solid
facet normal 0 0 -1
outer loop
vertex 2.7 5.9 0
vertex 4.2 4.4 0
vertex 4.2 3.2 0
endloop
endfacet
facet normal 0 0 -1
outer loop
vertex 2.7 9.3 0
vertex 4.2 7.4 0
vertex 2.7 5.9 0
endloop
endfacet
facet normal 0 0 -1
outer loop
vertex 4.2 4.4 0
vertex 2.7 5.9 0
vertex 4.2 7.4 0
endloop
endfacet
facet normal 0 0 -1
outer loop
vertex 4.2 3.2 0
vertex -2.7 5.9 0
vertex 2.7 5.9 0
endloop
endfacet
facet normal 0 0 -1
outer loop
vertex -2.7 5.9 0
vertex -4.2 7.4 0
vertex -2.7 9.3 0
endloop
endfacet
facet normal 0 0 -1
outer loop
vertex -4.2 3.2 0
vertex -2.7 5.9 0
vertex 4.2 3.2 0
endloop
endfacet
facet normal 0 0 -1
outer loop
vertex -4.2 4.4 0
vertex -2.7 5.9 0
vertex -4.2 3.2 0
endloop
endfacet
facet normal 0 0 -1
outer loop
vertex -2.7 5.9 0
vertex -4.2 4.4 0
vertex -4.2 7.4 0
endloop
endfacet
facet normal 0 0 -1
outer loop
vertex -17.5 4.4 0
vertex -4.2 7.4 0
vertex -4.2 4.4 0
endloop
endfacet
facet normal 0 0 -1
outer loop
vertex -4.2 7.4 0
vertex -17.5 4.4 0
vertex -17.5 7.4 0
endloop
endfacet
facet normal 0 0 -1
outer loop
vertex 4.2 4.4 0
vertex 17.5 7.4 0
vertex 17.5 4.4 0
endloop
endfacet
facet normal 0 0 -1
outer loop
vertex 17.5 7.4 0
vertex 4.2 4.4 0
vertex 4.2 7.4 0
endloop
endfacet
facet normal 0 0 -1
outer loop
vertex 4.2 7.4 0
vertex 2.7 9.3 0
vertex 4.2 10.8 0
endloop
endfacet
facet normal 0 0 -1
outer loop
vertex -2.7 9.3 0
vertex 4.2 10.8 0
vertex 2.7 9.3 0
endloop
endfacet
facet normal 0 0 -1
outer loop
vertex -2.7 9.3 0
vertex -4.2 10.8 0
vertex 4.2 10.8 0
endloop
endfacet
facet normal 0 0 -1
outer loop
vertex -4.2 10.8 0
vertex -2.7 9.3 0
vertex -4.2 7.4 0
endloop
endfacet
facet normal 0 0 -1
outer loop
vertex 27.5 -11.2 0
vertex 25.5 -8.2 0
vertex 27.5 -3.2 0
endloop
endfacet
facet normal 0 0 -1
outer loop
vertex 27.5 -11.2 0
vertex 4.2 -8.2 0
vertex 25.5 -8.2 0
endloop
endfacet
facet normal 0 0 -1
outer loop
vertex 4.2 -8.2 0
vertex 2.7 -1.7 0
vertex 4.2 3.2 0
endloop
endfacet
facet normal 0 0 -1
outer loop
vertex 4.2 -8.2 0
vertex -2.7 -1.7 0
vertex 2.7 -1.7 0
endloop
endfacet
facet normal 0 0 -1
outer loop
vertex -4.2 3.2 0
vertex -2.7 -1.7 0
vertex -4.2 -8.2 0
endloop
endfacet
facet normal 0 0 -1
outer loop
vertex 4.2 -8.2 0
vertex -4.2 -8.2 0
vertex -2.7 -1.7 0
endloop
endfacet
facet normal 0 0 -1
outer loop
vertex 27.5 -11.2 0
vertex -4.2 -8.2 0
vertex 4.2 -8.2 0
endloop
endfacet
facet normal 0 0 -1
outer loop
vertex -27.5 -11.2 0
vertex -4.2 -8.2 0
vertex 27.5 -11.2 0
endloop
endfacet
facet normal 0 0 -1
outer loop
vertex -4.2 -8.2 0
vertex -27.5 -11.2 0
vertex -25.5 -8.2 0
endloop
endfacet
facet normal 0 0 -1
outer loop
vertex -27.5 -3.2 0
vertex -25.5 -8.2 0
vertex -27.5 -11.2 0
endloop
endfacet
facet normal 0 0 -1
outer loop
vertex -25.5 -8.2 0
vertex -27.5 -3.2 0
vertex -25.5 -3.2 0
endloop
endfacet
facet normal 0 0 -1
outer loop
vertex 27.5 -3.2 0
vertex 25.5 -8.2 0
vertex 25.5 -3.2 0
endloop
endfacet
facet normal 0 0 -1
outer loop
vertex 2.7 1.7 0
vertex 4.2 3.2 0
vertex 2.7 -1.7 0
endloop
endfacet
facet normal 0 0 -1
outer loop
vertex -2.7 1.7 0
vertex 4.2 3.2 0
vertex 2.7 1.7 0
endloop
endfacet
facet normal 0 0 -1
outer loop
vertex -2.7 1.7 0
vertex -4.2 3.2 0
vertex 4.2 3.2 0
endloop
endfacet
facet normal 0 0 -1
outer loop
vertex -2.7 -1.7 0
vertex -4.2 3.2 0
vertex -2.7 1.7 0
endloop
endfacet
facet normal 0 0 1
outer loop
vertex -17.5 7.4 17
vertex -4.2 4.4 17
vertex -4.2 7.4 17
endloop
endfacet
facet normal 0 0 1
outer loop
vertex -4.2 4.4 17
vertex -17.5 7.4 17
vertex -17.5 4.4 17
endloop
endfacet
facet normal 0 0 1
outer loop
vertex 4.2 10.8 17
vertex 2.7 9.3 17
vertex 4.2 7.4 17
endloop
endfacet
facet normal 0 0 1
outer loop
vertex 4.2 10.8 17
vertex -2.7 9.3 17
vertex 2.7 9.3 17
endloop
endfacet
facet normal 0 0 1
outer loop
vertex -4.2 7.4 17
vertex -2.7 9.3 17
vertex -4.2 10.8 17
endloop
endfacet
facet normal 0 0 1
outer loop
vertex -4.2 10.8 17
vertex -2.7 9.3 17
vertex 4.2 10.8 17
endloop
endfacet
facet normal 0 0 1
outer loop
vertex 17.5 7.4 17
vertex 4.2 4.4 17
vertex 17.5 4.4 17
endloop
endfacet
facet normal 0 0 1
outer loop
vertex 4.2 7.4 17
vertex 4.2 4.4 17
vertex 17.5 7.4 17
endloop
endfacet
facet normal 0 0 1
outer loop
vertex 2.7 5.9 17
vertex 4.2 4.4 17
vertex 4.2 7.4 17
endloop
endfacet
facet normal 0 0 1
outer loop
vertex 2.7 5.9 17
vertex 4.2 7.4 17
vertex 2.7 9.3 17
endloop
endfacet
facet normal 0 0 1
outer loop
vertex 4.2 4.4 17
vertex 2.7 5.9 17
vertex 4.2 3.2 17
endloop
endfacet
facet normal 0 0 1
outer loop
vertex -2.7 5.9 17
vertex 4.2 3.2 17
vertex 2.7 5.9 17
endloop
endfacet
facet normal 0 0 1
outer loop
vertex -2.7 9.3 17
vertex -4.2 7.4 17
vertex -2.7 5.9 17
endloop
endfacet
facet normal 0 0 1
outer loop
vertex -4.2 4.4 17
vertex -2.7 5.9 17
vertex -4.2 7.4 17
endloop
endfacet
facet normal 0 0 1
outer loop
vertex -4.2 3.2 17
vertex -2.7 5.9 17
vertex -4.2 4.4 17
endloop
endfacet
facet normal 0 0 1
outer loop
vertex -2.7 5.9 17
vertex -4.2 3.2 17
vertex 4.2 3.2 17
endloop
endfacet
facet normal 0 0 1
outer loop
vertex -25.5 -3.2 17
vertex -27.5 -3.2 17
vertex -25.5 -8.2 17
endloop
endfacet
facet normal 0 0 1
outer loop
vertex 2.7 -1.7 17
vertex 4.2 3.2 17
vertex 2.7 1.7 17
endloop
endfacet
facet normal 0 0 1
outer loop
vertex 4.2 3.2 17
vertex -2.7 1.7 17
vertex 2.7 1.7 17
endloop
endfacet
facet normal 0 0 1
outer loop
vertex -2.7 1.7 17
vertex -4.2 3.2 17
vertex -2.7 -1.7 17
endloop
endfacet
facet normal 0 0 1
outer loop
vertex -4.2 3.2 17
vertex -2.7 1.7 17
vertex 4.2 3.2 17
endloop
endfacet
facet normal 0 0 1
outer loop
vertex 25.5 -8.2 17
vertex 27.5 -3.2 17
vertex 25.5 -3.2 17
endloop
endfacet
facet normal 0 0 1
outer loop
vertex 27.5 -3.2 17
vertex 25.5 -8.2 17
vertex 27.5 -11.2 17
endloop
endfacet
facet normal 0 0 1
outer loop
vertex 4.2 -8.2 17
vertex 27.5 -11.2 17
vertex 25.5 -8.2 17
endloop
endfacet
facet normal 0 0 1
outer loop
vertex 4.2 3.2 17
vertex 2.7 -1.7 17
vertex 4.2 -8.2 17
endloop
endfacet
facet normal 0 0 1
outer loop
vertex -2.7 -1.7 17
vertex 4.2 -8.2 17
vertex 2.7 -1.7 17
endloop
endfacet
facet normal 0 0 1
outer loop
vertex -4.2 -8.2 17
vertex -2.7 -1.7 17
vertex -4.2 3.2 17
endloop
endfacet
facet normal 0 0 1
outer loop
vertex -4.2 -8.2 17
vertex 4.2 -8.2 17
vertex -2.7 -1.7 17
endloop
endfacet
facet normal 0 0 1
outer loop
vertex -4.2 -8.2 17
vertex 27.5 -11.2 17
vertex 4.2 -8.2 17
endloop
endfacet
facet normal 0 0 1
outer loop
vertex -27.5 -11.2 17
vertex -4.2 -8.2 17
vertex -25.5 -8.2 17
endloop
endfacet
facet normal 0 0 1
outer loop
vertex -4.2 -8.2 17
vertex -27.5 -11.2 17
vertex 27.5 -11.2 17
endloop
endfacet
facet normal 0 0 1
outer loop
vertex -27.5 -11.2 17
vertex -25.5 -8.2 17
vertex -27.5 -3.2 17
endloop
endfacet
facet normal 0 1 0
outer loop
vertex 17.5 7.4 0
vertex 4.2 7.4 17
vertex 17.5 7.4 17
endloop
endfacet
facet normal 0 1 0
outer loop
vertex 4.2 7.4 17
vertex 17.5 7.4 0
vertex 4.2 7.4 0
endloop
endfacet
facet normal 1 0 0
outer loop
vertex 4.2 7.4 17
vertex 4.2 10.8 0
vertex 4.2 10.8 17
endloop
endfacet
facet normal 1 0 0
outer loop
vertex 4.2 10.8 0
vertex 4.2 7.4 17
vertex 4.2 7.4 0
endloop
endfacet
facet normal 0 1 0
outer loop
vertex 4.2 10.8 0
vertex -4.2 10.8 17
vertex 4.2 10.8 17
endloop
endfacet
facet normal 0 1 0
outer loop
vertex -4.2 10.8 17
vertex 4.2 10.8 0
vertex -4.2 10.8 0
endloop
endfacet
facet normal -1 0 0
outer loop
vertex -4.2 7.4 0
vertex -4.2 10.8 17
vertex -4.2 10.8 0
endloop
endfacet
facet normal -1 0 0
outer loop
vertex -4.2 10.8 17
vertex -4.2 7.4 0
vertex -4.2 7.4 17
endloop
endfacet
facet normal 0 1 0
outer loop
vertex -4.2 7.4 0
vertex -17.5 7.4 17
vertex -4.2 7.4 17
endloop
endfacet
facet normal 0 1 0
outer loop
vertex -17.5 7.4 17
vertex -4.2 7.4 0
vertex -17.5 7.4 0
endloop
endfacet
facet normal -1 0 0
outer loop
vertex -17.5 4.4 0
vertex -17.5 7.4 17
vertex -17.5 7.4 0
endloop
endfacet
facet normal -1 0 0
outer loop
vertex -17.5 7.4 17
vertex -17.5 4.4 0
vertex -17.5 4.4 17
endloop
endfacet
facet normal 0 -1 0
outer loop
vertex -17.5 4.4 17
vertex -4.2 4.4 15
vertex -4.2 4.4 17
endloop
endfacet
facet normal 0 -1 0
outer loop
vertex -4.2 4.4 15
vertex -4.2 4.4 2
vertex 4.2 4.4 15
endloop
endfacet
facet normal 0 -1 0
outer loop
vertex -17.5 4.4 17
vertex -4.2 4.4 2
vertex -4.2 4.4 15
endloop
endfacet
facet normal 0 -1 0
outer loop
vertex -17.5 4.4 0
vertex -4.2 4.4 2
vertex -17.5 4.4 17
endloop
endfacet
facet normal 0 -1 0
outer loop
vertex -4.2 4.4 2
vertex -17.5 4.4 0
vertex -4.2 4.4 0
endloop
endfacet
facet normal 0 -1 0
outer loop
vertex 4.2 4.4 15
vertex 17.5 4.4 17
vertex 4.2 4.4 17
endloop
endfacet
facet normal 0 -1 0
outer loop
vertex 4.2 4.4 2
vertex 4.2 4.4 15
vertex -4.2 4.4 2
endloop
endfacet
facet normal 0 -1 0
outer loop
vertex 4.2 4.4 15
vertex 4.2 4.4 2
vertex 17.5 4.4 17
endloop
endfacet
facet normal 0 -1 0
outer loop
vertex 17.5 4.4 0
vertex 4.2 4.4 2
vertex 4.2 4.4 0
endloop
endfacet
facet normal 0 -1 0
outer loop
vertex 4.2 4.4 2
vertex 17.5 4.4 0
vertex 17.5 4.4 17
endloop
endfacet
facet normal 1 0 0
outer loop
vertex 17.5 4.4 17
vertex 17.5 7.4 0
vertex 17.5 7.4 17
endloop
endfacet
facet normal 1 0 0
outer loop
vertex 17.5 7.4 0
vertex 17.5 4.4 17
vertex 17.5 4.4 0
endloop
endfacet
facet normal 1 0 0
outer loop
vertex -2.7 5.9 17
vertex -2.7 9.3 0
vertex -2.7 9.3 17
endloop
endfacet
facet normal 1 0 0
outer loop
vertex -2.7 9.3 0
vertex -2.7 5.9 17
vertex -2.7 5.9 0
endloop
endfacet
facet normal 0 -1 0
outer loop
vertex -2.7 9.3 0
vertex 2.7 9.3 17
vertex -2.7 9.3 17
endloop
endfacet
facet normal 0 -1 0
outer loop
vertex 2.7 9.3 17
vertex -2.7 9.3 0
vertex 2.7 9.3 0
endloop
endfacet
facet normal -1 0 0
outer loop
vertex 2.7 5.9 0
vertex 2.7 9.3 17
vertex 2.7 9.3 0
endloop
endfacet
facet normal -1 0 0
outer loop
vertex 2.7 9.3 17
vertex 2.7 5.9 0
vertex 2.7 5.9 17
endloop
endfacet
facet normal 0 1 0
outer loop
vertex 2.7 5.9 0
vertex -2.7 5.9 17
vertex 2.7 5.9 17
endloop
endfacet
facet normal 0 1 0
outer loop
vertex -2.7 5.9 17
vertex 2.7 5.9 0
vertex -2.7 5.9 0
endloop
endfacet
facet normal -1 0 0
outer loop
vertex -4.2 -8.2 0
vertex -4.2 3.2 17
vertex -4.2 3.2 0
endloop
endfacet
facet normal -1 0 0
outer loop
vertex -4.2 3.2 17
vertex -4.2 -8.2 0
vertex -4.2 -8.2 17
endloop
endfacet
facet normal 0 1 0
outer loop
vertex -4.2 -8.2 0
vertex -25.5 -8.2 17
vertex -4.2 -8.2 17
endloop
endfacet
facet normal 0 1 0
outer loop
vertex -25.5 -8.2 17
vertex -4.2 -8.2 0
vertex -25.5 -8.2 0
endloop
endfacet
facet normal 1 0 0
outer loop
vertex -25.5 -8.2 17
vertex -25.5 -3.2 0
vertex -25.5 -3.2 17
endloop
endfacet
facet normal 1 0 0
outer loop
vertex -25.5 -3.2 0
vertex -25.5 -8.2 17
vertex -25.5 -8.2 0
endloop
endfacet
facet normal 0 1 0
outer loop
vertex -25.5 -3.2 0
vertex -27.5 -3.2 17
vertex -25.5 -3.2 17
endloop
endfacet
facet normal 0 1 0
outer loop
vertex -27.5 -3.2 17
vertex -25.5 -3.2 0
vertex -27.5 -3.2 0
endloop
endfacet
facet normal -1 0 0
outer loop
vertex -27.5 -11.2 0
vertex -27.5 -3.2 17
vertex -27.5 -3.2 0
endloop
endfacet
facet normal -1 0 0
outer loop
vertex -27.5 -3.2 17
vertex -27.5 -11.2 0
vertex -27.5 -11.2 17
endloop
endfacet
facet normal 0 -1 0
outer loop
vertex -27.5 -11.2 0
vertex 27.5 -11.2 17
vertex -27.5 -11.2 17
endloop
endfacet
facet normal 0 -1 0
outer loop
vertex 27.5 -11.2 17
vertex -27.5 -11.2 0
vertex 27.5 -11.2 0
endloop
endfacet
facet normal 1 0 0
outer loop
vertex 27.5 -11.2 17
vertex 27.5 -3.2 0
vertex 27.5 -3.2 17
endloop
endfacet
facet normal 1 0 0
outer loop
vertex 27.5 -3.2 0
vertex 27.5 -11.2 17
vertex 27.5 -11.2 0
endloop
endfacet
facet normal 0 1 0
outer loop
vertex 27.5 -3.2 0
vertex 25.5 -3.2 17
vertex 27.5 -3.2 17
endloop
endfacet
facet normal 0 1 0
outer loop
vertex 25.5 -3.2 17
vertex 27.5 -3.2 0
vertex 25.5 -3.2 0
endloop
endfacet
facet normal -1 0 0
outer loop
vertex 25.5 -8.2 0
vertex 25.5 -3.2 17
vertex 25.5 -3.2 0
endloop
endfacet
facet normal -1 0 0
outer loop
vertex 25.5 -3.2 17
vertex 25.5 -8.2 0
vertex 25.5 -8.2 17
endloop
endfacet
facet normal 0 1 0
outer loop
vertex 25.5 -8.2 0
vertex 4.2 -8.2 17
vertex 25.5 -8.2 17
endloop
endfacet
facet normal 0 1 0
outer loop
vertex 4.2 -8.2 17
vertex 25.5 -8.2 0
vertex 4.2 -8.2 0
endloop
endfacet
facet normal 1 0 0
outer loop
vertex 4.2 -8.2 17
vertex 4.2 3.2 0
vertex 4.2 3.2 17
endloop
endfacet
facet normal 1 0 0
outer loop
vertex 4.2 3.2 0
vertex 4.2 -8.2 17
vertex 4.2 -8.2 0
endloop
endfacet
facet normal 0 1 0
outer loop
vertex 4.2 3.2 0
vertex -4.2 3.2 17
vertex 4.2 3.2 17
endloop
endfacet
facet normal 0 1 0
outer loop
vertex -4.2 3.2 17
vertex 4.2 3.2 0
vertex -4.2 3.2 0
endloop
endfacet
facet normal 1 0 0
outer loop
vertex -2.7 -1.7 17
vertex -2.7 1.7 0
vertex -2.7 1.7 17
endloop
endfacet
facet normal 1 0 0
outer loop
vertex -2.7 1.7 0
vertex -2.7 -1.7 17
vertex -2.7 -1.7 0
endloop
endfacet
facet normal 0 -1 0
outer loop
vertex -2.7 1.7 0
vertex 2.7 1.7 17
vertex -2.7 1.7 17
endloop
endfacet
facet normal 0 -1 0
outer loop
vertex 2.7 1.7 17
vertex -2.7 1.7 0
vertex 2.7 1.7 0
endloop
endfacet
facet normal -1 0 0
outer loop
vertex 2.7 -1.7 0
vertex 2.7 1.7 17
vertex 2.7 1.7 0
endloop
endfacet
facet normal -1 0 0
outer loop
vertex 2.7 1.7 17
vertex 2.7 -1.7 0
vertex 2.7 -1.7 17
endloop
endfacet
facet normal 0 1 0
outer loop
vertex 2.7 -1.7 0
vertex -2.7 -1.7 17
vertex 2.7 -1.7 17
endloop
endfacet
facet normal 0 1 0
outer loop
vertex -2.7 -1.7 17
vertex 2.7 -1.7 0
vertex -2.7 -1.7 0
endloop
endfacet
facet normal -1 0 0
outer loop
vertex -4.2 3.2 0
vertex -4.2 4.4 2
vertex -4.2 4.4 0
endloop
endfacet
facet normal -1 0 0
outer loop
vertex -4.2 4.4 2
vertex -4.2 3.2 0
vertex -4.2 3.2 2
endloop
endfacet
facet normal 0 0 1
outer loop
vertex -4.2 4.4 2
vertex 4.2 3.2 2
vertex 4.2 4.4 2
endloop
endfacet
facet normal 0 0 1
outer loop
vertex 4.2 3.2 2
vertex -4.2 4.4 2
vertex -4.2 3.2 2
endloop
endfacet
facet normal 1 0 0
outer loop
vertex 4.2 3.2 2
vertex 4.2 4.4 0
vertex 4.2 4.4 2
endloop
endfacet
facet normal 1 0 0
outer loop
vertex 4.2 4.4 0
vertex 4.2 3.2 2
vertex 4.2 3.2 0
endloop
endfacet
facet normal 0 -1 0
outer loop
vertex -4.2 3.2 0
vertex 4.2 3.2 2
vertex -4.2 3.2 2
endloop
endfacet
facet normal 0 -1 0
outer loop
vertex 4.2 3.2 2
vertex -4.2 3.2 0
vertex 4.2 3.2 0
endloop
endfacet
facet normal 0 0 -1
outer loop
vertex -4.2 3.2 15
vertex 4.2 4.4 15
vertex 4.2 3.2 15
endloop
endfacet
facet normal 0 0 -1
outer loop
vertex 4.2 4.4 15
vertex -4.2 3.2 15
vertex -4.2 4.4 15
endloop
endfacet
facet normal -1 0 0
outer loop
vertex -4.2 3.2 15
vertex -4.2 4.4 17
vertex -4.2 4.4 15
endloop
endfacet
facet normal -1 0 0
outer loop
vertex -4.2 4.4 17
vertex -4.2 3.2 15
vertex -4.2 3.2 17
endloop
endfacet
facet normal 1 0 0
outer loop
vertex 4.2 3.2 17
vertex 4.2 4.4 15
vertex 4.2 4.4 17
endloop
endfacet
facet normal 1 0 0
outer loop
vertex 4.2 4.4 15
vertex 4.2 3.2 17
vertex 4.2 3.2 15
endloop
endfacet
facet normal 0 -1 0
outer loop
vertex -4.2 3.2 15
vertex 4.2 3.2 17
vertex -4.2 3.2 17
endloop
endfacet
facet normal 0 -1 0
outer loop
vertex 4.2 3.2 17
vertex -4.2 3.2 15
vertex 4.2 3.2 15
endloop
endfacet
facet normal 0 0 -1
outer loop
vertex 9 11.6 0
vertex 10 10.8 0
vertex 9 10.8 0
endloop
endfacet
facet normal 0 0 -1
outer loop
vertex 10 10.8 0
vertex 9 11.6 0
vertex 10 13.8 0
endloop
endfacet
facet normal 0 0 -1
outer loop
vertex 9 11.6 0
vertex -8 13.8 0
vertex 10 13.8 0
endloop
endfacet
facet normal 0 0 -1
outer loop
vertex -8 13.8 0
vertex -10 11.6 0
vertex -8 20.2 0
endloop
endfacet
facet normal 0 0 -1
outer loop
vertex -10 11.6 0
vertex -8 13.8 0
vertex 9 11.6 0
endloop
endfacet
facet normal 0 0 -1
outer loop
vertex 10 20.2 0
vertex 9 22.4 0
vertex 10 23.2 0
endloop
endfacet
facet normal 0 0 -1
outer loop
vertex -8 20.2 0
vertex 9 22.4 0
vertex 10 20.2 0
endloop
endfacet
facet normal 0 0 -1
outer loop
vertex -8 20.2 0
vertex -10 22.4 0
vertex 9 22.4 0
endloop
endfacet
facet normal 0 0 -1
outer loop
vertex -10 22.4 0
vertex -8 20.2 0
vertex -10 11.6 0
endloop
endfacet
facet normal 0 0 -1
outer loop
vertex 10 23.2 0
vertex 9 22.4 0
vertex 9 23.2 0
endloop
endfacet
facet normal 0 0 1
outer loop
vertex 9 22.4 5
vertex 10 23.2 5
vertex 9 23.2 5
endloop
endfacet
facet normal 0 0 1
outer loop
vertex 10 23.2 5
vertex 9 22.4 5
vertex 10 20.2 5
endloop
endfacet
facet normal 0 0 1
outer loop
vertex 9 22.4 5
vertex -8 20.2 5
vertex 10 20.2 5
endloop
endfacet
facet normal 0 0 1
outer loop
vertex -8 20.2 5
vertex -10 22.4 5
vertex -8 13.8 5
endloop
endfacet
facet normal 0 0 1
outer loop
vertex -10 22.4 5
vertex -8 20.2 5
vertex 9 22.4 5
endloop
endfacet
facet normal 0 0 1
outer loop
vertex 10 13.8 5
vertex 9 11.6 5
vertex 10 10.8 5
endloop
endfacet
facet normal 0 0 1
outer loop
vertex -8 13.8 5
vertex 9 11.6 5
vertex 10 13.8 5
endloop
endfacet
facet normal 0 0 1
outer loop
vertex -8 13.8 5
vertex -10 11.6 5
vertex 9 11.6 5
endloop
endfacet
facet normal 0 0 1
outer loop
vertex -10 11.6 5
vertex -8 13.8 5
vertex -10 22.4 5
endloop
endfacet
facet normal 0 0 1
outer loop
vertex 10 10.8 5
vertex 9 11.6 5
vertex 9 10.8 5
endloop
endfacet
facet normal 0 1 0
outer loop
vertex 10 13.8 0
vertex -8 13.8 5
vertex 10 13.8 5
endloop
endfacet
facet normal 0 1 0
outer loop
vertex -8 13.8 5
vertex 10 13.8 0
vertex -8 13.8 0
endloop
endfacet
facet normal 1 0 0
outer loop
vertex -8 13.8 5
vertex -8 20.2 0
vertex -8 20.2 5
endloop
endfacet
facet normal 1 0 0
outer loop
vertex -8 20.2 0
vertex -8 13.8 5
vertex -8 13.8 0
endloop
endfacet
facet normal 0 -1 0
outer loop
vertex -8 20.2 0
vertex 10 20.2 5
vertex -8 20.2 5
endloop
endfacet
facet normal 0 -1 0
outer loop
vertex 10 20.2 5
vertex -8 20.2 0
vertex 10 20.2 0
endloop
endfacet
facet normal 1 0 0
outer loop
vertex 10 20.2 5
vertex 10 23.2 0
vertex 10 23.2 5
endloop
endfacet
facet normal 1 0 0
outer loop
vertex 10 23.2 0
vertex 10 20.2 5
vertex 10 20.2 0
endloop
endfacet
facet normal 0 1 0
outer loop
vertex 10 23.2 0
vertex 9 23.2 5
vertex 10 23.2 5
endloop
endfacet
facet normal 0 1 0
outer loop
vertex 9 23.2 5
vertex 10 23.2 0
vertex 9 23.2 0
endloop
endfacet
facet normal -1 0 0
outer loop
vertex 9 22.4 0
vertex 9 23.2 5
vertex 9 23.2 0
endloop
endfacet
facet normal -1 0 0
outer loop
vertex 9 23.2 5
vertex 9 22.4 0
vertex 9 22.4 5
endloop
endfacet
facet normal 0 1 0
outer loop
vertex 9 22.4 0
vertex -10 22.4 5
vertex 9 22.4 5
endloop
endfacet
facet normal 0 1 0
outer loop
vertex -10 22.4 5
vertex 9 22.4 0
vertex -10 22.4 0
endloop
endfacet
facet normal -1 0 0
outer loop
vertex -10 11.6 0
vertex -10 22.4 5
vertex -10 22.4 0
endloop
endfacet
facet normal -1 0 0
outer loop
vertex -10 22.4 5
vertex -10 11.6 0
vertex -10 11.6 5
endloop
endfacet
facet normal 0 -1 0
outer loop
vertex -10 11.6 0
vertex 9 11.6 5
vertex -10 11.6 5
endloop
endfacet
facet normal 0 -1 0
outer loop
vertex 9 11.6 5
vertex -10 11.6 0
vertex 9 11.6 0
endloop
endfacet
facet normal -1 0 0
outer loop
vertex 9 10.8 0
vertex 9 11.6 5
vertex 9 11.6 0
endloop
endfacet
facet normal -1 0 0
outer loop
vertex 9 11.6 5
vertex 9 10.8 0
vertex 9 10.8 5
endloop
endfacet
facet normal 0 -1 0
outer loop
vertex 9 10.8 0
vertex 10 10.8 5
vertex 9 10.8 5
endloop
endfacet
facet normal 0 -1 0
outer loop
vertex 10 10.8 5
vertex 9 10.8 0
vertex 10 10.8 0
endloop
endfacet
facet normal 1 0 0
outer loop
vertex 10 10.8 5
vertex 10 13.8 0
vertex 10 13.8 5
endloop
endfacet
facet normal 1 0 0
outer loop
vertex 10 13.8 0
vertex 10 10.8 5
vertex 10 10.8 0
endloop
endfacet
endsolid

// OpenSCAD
pin_width = 5;
pin_depth = 3;
pin_clearance_buffer = 0.4;
pin_hole_wall_thickness = 3;
pin_hole_width = pin_width + pin_clearance_buffer;
pin_hole_depth = pin_depth + pin_clearance_buffer;
pin_hole_wall_width = pin_hole_width + pin_hole_wall_thickness;
pin_hole_wall_depth = pin_hole_depth + pin_hole_wall_thickness;

band_space = 1.2;
band_wall_thickness = 2;

ceiling_width = 35;
ceiling_dep = 3;
ceiling_y_offset = ceiling_dep / 2 + pin_hole_wall_depth/2 + band_space;

top_pinhole_y_offset = pin_hole_wall_depth + band_space;

extrude_height = 17;

// Top
// Pinhole

linear_extrude(height = extrude_height)  {
    translate([0, top_pinhole_y_offset]){
        difference() {
            union() {
                // ceiling
                translate([0, (-(pin_hole_wall_depth - ceiling_dep)/2) ]) {
                    square([ceiling_width, ceiling_dep], center=true);
                }
                // ceiling pinhole
                square([pin_hole_wall_width, pin_hole_wall_depth], center=true);
            }
            square([pin_hole_width, pin_hole_depth], center = true);
        }
    }

    // Bottom
    // Pinhole
    difference() {
        square([pin_hole_wall_width, pin_hole_wall_depth], center=true);
        square([pin_hole_width, pin_hole_depth], center = true);
    }

    // Stem
    stem_width = pin_hole_wall_width;
    stem_depth =  5;
    stem_y_offset= -stem_depth/2 - pin_hole_wall_depth/2;
    translate([0, stem_y_offset]) {
        square([stem_width, stem_depth], center=true);
    } 

    // Floor
    floor_width = ceiling_width + 20;
    floor_depth = 3;
    floor_y_offset = -floor_depth/2 - pin_hole_wall_depth/2 - stem_depth;
    floor_wing_width = 2;
    floor_wing_depth = 5;

    translate([0, floor_y_offset]) {
        square([floor_width, floor_depth], center=true);
        translate([floor_width/2 - floor_wing_width, floor_depth/2]) {
            square([floor_wing_width, floor_wing_depth]);
        }
        translate([-floor_width/2, floor_depth/2]) {
            square([floor_wing_width, floor_wing_depth]);
        }
    }
}

// Band_space
band_space_offset = band_space/2 + pin_hole_wall_depth/2;
linear_extrude(band_wall_thickness) {
    translate([0, band_space_offset, 0]) {
        square([pin_hole_wall_width, band_space], center=true);
    }
}

translate([0, band_space_offset, extrude_height - band_wall_thickness]) {
    linear_extrude(height = band_wall_thickness) {
        square([pin_hole_wall_width, band_space], center=true);
    }
}

ceiling_floor_arm_space = 0.2;
arm_thickness = 2;
pin_arm_latch_width = 1;
pin_arm_latch_depth = 1.6;
pin_arm_space = ceiling_floor_arm_space + pin_depth * 2 + pin_arm_latch_depth - 1.4;
pin_arm_width = extrude_height + arm_thickness + pin_arm_latch_width;
pin_arm_depth = pin_depth * 2 + pin_arm_space - pin_arm_latch_depth;
pin_arm_y_offset = pin_arm_depth/2 + pin_hole_wall_depth/2 + pin_hole_wall_depth + 2;
pin_arm_x_offset = 0;
//pin_arm_y_offset = 3.8;
// pin_arm_x_offset = -pin_arm_width/2;

#linear_extrude(height = pin_width) {
    translate([pin_arm_x_offset, pin_arm_y_offset]) {
        difference() {
            union() {
                square([pin_arm_width, pin_arm_depth], center = true);
                translate([pin_arm_width/2 - pin_arm_latch_width/2, pin_arm_depth/2]) {
                    square([pin_arm_latch_width, pin_arm_latch_depth], center=true);
                }
                translate([pin_arm_width/2 - pin_arm_latch_width/2, -pin_arm_depth/2]) {
                    square([pin_arm_latch_width, pin_arm_latch_depth], center=true);
                }
            }
            translate([arm_thickness/2, 0]) { 
                square([pin_arm_width - arm_thickness, pin_arm_space],center = true);
            }
        }
    }
} 
